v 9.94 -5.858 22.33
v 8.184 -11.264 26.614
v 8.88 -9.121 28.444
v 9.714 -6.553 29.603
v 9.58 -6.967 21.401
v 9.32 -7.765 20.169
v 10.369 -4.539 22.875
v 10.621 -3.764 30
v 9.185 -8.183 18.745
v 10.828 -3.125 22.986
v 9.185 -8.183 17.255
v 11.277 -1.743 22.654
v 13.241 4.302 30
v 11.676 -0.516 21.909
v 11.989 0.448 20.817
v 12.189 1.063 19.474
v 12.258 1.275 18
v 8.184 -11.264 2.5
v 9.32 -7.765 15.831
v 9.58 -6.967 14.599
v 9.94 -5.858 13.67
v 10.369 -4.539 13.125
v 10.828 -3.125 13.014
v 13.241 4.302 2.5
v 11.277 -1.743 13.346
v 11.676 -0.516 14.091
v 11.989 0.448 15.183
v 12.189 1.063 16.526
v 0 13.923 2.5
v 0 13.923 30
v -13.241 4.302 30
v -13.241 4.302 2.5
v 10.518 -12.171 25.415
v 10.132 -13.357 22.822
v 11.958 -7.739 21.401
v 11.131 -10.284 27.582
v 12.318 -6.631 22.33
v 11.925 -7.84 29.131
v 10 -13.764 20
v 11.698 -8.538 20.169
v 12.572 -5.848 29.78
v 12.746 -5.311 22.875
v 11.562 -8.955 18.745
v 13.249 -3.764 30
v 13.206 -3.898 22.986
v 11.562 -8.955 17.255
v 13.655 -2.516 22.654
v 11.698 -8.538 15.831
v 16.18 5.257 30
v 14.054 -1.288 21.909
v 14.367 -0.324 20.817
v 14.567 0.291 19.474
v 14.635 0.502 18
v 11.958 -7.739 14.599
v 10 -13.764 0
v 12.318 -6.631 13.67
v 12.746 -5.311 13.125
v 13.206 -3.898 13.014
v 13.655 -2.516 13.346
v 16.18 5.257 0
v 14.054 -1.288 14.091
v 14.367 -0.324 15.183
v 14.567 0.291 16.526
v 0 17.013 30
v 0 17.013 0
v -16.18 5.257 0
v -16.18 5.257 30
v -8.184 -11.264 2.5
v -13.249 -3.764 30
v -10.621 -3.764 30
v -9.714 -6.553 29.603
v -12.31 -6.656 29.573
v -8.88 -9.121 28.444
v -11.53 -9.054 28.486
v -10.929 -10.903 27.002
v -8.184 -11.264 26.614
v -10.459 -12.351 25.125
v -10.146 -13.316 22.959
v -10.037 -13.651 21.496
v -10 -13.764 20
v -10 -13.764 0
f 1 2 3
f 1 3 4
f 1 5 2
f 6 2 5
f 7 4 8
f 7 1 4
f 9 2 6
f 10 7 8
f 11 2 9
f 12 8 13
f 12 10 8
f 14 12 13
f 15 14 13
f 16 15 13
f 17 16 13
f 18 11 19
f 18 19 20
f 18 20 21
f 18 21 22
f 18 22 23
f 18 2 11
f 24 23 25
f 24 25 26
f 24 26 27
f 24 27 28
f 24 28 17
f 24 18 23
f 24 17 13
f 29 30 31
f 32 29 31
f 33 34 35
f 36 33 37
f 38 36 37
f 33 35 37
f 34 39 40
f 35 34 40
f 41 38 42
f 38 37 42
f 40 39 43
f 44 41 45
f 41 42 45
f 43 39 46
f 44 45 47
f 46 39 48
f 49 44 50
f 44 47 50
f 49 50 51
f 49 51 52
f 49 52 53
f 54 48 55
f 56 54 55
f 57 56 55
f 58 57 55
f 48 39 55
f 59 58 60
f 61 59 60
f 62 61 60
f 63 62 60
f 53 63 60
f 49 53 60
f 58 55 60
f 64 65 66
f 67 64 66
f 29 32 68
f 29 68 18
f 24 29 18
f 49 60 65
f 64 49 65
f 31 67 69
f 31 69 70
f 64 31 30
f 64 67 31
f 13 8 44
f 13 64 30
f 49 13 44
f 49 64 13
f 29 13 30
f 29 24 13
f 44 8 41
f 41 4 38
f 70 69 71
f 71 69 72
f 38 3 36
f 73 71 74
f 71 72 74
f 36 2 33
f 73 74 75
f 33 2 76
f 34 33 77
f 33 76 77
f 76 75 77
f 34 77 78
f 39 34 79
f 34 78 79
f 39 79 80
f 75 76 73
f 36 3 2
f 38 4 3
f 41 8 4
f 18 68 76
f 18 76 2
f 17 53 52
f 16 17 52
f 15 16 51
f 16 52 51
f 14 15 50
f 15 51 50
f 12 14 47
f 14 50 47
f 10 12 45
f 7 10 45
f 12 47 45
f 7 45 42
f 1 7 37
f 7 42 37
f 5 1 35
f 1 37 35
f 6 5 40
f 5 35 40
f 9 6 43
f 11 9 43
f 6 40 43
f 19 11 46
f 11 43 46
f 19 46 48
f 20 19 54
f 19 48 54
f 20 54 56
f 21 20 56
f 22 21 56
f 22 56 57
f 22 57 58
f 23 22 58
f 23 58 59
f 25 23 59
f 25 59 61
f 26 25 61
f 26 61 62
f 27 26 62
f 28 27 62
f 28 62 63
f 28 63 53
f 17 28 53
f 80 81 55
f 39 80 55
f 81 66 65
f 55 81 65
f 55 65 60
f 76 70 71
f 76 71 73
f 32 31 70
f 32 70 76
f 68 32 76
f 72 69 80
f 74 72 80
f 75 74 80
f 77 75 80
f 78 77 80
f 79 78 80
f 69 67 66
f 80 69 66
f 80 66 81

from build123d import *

# Parameters (mm, degrees)
F1_DEPTH    = 30
F2_T        = -2.5
F3_R        = 5
F4_DEPTH    = 12.6
F5_T1_DEPTH = 70


# Not quite as in the source:
# - a fillet or chamfer that OpenCascade refuses, or shapes differently, is made with other operations: its cross-section is extruded or revolved along the edge and cut away or added


with BuildPart() as f1:
    # F0 (on Top) → F1 (new body)
    with BuildSketch(Plane.XY):
        Polygon((16.1803398875, 5.2573111212), (0, 17.013016167), (-16.1803398875, 5.2573111212), (-10, -13.7638192047), (10, -13.7638192047), align=None)
    extrude(amount=F1_DEPTH)

    # F2
    f2_openings = [f1.faces().sort_by_distance(p)[0] for p in [
        (0, 0, 30),
    ]]
    offset(amount=F2_T, openings=f2_openings)

    # F3 (on face) → F4 (cut)
    with BuildSketch(Plane(origin=(13.0901699437, -4.2532540418, 0), x_dir=(0.3090169944, 0.9510565163, 0), z_dir=(0.9510565163, -0.3090169944, 0))):
        with Locations((0, 18)):
            Circle(F3_R)
    extrude(amount=-F4_DEPTH, mode=Mode.SUBTRACT)

    # F5: fillet of radius 10 on 1 edges, made by hand

    # F5_s2 → F5_t1 (cut)
    with BuildSketch(Plane.YZ.offset(-35)):
        with BuildLine():
            ThreePointArc((-3.7638192047, 30), (-10.8348870166, 27.0710678119), (-13.7638192047, 20))
            Line((-13.7638192047, 20), (-13.7638192047, 30))
            Line((-13.7638192047, 30), (-3.7638192047, 30))
        make_face()
    extrude(amount=F5_T1_DEPTH, mode=Mode.SUBTRACT)


solid = f1.part
